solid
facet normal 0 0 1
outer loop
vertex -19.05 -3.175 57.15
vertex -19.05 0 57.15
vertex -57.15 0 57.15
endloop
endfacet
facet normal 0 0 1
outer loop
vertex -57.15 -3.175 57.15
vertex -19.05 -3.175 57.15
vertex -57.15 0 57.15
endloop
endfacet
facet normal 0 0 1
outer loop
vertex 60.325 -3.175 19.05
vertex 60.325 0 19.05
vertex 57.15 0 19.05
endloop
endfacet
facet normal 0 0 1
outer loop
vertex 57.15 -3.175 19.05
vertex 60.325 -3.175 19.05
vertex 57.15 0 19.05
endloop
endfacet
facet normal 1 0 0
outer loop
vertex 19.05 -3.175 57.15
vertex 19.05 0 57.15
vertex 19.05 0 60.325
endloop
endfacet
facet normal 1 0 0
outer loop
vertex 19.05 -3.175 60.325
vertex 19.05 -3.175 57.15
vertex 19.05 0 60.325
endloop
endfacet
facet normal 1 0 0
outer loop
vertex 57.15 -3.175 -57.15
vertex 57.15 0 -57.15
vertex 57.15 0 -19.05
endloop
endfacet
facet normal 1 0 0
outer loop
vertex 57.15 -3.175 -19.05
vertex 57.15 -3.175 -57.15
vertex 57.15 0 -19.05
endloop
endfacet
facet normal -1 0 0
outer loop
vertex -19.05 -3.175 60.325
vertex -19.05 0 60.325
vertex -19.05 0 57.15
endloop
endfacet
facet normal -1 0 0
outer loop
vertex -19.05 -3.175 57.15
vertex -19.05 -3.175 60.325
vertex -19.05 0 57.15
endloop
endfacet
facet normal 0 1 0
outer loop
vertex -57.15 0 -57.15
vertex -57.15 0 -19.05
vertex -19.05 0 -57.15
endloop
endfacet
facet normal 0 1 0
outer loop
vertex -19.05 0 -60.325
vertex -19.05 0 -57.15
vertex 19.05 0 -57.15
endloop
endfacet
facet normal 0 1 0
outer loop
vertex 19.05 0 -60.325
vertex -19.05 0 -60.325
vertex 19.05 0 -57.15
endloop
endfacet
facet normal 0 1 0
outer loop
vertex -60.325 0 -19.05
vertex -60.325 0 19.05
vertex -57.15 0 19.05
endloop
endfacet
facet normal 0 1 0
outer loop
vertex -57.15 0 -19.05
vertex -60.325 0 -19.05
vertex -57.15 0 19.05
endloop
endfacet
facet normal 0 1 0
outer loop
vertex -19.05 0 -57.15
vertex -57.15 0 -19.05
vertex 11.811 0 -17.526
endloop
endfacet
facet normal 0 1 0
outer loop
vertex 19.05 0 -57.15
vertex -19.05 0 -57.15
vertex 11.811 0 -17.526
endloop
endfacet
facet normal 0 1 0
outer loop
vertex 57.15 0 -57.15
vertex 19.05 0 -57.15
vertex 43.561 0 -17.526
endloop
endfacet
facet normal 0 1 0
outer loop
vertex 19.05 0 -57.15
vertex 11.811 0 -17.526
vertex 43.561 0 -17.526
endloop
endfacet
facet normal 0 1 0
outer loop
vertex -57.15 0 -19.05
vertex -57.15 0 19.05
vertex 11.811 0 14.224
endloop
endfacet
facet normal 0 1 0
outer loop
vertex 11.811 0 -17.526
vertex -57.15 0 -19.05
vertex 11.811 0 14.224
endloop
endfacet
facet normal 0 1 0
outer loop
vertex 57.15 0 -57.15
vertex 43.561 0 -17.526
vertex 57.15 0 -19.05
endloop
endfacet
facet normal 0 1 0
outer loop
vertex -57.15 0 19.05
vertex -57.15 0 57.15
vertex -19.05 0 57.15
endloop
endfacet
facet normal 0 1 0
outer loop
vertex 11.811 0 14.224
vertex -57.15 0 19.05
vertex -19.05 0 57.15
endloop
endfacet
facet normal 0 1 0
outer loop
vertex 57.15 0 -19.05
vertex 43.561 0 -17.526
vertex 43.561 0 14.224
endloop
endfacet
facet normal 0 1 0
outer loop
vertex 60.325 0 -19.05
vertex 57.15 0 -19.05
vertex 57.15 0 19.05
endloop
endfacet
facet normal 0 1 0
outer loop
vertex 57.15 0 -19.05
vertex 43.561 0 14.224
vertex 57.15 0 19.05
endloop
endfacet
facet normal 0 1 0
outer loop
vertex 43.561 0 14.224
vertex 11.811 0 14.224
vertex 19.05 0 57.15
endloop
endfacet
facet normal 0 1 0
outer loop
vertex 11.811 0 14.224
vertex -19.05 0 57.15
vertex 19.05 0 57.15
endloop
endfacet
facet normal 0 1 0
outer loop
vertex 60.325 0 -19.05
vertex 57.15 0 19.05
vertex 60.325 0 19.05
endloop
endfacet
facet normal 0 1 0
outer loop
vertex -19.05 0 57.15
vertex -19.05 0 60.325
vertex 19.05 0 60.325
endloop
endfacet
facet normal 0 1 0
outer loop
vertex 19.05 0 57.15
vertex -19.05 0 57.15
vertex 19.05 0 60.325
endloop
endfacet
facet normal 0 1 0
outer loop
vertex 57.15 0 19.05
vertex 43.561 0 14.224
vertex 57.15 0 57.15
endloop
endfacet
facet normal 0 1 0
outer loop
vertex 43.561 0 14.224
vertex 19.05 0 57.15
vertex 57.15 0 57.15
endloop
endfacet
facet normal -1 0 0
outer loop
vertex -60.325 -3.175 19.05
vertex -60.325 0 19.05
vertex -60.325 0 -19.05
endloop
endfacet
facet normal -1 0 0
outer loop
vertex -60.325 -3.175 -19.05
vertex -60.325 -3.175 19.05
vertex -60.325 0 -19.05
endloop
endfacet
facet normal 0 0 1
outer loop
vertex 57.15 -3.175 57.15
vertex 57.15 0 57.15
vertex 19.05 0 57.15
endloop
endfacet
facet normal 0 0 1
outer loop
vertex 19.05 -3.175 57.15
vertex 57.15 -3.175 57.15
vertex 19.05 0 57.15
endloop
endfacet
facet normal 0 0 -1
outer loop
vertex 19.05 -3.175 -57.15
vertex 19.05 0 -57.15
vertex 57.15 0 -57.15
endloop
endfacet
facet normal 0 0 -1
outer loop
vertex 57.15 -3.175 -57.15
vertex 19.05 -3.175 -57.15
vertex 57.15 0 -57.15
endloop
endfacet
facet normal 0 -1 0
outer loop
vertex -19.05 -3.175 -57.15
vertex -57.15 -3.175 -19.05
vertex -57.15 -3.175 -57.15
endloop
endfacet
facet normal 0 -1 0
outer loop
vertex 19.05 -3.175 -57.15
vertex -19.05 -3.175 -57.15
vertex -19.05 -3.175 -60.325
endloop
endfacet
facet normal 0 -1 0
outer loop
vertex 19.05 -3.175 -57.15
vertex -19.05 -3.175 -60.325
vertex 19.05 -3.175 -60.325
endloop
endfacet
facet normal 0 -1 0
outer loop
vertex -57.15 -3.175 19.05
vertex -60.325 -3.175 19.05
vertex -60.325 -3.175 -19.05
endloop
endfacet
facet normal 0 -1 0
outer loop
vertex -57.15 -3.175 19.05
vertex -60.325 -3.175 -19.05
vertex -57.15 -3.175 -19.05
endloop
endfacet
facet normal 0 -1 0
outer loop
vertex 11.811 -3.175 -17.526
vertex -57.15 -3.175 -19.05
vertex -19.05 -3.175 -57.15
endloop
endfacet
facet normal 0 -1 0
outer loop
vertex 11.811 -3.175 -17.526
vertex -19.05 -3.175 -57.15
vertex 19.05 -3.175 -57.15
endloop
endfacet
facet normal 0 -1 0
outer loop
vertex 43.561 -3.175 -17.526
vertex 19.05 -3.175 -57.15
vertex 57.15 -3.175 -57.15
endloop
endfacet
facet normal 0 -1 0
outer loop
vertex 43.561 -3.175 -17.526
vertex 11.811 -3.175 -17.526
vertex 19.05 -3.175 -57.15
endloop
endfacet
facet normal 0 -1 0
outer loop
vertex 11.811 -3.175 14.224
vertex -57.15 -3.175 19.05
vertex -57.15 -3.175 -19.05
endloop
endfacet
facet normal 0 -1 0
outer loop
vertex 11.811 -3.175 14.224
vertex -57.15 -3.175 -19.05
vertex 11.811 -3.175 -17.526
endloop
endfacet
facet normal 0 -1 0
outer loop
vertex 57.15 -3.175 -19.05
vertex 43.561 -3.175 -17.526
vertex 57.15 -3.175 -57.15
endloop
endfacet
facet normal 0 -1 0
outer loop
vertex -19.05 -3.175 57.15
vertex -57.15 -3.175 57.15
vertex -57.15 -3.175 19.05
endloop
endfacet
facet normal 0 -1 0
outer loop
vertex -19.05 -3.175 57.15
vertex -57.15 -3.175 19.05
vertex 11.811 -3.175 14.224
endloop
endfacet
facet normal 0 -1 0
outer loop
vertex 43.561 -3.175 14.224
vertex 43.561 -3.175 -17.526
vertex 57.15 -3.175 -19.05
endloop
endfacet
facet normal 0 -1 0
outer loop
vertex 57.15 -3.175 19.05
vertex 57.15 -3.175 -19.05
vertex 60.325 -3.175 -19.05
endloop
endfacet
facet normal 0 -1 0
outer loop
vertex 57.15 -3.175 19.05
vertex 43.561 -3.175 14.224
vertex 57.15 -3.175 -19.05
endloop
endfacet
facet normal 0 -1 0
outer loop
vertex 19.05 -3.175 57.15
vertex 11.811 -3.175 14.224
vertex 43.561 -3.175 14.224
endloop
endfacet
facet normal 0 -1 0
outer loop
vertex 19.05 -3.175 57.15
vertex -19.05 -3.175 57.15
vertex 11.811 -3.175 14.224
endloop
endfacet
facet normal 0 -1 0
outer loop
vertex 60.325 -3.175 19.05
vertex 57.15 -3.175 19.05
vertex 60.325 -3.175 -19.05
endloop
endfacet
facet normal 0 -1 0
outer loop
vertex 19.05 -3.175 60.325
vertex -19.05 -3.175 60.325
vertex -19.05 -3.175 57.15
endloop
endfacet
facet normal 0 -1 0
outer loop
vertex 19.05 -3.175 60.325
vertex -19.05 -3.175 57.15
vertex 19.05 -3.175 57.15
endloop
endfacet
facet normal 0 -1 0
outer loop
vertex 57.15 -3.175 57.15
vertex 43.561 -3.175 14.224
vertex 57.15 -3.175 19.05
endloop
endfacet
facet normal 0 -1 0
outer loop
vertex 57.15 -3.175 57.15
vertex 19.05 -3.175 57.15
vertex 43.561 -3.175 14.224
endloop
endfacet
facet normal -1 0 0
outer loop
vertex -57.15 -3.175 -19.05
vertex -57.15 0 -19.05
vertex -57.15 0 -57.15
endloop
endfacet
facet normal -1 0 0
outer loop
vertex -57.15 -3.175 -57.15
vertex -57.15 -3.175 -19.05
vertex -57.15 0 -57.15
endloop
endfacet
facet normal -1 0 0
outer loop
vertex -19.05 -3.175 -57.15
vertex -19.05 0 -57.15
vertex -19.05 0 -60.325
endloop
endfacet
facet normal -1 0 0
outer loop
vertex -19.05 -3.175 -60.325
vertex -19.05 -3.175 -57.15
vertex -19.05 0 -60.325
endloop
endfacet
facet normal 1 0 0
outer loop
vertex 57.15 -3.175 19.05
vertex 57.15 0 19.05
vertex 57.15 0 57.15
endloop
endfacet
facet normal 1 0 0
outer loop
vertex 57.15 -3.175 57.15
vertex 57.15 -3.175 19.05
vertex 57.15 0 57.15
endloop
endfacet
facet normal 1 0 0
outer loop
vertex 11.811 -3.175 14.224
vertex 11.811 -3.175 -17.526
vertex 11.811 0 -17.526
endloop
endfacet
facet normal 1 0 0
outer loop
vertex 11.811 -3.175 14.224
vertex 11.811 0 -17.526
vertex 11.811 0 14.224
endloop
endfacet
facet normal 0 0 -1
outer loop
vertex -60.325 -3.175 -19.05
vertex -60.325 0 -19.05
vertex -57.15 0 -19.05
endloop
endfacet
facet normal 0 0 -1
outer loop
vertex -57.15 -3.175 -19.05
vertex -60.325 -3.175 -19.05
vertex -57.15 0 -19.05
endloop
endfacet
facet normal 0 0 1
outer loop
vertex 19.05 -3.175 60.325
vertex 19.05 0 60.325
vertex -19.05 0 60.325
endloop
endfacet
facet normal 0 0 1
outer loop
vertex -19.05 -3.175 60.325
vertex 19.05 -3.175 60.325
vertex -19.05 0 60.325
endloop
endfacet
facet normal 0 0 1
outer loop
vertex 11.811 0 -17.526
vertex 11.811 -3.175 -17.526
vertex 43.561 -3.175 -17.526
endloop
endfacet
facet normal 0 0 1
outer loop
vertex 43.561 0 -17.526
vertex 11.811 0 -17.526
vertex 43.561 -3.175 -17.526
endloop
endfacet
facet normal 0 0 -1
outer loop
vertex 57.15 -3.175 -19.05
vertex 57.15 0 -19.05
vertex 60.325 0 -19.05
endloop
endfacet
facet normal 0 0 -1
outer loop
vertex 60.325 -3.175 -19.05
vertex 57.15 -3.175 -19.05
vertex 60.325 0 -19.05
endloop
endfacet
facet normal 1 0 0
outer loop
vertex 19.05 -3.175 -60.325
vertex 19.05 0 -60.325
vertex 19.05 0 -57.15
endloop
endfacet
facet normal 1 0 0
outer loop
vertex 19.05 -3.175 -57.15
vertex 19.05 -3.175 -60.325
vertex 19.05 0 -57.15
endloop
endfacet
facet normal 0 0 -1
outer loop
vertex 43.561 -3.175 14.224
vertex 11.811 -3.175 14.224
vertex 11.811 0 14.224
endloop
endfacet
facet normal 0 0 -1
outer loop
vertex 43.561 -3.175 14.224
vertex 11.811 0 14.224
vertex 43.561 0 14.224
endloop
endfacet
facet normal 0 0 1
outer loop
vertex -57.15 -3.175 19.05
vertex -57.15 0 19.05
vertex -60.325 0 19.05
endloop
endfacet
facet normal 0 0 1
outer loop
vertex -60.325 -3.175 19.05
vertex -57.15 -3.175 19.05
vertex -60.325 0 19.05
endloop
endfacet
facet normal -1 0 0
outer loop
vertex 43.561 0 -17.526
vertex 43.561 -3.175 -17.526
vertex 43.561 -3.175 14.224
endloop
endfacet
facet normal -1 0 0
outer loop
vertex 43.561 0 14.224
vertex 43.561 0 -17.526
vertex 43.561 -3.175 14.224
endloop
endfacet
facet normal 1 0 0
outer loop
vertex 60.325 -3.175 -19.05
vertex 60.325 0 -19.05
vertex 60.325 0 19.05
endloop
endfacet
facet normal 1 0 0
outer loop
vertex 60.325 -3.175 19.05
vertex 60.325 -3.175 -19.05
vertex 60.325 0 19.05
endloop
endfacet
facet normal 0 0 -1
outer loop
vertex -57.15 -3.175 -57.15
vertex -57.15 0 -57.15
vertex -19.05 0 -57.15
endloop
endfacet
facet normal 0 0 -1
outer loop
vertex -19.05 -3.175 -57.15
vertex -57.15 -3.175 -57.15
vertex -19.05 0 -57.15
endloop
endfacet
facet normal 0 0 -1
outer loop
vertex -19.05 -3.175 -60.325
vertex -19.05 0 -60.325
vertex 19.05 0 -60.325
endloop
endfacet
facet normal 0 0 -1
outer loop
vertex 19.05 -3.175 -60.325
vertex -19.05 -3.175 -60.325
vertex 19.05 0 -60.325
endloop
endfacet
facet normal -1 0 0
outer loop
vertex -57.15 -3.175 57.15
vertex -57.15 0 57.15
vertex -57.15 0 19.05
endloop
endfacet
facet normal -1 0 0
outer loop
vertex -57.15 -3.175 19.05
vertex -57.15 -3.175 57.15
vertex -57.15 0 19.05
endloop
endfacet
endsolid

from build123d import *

# Parameters (mm, degrees)
F1_DEPTH = 3.175
F2_W     = 31.75
F2_H     = 31.75
F3_DEPTH = 3.176


with BuildPart() as f1:
    # F0 (on Front) → F1 (new body)
    with BuildSketch(Plane.XZ):
        Polygon((57.15, -19.05), (60.325, -19.05), (60.325, 19.05), (57.15, 19.05), (57.15, 57.15), (19.05, 57.15), (19.05, 60.325), (-19.05, 60.325), (-19.05, 57.15), (-57.15, 57.15), (-57.15, 19.05), (-60.325, 19.05), (-60.325, 0), (-60.325, -19.05), (-57.15, -19.05), (-57.15, -57.15), (-19.05, -57.15), (-16.51, -57.15), (19.05, -57.15), (57.15, -57.15), align=None)
        Polygon((0, -60.325), (19.05, -60.325), (19.05, -57.15), (-16.51, -57.15), (-19.05, -57.15), (-19.05, -60.325), align=None)
    extrude(amount=F1_DEPTH)

    # F2 (on face) → F3 (cut, through all)
    with BuildSketch(Plane.XZ.offset(3.175)):
        with Locations((27.686, -1.651)):
            Rectangle(F2_W, F2_H)
    extrude(amount=-F3_DEPTH, mode=Mode.SUBTRACT)


solid = f1.part
